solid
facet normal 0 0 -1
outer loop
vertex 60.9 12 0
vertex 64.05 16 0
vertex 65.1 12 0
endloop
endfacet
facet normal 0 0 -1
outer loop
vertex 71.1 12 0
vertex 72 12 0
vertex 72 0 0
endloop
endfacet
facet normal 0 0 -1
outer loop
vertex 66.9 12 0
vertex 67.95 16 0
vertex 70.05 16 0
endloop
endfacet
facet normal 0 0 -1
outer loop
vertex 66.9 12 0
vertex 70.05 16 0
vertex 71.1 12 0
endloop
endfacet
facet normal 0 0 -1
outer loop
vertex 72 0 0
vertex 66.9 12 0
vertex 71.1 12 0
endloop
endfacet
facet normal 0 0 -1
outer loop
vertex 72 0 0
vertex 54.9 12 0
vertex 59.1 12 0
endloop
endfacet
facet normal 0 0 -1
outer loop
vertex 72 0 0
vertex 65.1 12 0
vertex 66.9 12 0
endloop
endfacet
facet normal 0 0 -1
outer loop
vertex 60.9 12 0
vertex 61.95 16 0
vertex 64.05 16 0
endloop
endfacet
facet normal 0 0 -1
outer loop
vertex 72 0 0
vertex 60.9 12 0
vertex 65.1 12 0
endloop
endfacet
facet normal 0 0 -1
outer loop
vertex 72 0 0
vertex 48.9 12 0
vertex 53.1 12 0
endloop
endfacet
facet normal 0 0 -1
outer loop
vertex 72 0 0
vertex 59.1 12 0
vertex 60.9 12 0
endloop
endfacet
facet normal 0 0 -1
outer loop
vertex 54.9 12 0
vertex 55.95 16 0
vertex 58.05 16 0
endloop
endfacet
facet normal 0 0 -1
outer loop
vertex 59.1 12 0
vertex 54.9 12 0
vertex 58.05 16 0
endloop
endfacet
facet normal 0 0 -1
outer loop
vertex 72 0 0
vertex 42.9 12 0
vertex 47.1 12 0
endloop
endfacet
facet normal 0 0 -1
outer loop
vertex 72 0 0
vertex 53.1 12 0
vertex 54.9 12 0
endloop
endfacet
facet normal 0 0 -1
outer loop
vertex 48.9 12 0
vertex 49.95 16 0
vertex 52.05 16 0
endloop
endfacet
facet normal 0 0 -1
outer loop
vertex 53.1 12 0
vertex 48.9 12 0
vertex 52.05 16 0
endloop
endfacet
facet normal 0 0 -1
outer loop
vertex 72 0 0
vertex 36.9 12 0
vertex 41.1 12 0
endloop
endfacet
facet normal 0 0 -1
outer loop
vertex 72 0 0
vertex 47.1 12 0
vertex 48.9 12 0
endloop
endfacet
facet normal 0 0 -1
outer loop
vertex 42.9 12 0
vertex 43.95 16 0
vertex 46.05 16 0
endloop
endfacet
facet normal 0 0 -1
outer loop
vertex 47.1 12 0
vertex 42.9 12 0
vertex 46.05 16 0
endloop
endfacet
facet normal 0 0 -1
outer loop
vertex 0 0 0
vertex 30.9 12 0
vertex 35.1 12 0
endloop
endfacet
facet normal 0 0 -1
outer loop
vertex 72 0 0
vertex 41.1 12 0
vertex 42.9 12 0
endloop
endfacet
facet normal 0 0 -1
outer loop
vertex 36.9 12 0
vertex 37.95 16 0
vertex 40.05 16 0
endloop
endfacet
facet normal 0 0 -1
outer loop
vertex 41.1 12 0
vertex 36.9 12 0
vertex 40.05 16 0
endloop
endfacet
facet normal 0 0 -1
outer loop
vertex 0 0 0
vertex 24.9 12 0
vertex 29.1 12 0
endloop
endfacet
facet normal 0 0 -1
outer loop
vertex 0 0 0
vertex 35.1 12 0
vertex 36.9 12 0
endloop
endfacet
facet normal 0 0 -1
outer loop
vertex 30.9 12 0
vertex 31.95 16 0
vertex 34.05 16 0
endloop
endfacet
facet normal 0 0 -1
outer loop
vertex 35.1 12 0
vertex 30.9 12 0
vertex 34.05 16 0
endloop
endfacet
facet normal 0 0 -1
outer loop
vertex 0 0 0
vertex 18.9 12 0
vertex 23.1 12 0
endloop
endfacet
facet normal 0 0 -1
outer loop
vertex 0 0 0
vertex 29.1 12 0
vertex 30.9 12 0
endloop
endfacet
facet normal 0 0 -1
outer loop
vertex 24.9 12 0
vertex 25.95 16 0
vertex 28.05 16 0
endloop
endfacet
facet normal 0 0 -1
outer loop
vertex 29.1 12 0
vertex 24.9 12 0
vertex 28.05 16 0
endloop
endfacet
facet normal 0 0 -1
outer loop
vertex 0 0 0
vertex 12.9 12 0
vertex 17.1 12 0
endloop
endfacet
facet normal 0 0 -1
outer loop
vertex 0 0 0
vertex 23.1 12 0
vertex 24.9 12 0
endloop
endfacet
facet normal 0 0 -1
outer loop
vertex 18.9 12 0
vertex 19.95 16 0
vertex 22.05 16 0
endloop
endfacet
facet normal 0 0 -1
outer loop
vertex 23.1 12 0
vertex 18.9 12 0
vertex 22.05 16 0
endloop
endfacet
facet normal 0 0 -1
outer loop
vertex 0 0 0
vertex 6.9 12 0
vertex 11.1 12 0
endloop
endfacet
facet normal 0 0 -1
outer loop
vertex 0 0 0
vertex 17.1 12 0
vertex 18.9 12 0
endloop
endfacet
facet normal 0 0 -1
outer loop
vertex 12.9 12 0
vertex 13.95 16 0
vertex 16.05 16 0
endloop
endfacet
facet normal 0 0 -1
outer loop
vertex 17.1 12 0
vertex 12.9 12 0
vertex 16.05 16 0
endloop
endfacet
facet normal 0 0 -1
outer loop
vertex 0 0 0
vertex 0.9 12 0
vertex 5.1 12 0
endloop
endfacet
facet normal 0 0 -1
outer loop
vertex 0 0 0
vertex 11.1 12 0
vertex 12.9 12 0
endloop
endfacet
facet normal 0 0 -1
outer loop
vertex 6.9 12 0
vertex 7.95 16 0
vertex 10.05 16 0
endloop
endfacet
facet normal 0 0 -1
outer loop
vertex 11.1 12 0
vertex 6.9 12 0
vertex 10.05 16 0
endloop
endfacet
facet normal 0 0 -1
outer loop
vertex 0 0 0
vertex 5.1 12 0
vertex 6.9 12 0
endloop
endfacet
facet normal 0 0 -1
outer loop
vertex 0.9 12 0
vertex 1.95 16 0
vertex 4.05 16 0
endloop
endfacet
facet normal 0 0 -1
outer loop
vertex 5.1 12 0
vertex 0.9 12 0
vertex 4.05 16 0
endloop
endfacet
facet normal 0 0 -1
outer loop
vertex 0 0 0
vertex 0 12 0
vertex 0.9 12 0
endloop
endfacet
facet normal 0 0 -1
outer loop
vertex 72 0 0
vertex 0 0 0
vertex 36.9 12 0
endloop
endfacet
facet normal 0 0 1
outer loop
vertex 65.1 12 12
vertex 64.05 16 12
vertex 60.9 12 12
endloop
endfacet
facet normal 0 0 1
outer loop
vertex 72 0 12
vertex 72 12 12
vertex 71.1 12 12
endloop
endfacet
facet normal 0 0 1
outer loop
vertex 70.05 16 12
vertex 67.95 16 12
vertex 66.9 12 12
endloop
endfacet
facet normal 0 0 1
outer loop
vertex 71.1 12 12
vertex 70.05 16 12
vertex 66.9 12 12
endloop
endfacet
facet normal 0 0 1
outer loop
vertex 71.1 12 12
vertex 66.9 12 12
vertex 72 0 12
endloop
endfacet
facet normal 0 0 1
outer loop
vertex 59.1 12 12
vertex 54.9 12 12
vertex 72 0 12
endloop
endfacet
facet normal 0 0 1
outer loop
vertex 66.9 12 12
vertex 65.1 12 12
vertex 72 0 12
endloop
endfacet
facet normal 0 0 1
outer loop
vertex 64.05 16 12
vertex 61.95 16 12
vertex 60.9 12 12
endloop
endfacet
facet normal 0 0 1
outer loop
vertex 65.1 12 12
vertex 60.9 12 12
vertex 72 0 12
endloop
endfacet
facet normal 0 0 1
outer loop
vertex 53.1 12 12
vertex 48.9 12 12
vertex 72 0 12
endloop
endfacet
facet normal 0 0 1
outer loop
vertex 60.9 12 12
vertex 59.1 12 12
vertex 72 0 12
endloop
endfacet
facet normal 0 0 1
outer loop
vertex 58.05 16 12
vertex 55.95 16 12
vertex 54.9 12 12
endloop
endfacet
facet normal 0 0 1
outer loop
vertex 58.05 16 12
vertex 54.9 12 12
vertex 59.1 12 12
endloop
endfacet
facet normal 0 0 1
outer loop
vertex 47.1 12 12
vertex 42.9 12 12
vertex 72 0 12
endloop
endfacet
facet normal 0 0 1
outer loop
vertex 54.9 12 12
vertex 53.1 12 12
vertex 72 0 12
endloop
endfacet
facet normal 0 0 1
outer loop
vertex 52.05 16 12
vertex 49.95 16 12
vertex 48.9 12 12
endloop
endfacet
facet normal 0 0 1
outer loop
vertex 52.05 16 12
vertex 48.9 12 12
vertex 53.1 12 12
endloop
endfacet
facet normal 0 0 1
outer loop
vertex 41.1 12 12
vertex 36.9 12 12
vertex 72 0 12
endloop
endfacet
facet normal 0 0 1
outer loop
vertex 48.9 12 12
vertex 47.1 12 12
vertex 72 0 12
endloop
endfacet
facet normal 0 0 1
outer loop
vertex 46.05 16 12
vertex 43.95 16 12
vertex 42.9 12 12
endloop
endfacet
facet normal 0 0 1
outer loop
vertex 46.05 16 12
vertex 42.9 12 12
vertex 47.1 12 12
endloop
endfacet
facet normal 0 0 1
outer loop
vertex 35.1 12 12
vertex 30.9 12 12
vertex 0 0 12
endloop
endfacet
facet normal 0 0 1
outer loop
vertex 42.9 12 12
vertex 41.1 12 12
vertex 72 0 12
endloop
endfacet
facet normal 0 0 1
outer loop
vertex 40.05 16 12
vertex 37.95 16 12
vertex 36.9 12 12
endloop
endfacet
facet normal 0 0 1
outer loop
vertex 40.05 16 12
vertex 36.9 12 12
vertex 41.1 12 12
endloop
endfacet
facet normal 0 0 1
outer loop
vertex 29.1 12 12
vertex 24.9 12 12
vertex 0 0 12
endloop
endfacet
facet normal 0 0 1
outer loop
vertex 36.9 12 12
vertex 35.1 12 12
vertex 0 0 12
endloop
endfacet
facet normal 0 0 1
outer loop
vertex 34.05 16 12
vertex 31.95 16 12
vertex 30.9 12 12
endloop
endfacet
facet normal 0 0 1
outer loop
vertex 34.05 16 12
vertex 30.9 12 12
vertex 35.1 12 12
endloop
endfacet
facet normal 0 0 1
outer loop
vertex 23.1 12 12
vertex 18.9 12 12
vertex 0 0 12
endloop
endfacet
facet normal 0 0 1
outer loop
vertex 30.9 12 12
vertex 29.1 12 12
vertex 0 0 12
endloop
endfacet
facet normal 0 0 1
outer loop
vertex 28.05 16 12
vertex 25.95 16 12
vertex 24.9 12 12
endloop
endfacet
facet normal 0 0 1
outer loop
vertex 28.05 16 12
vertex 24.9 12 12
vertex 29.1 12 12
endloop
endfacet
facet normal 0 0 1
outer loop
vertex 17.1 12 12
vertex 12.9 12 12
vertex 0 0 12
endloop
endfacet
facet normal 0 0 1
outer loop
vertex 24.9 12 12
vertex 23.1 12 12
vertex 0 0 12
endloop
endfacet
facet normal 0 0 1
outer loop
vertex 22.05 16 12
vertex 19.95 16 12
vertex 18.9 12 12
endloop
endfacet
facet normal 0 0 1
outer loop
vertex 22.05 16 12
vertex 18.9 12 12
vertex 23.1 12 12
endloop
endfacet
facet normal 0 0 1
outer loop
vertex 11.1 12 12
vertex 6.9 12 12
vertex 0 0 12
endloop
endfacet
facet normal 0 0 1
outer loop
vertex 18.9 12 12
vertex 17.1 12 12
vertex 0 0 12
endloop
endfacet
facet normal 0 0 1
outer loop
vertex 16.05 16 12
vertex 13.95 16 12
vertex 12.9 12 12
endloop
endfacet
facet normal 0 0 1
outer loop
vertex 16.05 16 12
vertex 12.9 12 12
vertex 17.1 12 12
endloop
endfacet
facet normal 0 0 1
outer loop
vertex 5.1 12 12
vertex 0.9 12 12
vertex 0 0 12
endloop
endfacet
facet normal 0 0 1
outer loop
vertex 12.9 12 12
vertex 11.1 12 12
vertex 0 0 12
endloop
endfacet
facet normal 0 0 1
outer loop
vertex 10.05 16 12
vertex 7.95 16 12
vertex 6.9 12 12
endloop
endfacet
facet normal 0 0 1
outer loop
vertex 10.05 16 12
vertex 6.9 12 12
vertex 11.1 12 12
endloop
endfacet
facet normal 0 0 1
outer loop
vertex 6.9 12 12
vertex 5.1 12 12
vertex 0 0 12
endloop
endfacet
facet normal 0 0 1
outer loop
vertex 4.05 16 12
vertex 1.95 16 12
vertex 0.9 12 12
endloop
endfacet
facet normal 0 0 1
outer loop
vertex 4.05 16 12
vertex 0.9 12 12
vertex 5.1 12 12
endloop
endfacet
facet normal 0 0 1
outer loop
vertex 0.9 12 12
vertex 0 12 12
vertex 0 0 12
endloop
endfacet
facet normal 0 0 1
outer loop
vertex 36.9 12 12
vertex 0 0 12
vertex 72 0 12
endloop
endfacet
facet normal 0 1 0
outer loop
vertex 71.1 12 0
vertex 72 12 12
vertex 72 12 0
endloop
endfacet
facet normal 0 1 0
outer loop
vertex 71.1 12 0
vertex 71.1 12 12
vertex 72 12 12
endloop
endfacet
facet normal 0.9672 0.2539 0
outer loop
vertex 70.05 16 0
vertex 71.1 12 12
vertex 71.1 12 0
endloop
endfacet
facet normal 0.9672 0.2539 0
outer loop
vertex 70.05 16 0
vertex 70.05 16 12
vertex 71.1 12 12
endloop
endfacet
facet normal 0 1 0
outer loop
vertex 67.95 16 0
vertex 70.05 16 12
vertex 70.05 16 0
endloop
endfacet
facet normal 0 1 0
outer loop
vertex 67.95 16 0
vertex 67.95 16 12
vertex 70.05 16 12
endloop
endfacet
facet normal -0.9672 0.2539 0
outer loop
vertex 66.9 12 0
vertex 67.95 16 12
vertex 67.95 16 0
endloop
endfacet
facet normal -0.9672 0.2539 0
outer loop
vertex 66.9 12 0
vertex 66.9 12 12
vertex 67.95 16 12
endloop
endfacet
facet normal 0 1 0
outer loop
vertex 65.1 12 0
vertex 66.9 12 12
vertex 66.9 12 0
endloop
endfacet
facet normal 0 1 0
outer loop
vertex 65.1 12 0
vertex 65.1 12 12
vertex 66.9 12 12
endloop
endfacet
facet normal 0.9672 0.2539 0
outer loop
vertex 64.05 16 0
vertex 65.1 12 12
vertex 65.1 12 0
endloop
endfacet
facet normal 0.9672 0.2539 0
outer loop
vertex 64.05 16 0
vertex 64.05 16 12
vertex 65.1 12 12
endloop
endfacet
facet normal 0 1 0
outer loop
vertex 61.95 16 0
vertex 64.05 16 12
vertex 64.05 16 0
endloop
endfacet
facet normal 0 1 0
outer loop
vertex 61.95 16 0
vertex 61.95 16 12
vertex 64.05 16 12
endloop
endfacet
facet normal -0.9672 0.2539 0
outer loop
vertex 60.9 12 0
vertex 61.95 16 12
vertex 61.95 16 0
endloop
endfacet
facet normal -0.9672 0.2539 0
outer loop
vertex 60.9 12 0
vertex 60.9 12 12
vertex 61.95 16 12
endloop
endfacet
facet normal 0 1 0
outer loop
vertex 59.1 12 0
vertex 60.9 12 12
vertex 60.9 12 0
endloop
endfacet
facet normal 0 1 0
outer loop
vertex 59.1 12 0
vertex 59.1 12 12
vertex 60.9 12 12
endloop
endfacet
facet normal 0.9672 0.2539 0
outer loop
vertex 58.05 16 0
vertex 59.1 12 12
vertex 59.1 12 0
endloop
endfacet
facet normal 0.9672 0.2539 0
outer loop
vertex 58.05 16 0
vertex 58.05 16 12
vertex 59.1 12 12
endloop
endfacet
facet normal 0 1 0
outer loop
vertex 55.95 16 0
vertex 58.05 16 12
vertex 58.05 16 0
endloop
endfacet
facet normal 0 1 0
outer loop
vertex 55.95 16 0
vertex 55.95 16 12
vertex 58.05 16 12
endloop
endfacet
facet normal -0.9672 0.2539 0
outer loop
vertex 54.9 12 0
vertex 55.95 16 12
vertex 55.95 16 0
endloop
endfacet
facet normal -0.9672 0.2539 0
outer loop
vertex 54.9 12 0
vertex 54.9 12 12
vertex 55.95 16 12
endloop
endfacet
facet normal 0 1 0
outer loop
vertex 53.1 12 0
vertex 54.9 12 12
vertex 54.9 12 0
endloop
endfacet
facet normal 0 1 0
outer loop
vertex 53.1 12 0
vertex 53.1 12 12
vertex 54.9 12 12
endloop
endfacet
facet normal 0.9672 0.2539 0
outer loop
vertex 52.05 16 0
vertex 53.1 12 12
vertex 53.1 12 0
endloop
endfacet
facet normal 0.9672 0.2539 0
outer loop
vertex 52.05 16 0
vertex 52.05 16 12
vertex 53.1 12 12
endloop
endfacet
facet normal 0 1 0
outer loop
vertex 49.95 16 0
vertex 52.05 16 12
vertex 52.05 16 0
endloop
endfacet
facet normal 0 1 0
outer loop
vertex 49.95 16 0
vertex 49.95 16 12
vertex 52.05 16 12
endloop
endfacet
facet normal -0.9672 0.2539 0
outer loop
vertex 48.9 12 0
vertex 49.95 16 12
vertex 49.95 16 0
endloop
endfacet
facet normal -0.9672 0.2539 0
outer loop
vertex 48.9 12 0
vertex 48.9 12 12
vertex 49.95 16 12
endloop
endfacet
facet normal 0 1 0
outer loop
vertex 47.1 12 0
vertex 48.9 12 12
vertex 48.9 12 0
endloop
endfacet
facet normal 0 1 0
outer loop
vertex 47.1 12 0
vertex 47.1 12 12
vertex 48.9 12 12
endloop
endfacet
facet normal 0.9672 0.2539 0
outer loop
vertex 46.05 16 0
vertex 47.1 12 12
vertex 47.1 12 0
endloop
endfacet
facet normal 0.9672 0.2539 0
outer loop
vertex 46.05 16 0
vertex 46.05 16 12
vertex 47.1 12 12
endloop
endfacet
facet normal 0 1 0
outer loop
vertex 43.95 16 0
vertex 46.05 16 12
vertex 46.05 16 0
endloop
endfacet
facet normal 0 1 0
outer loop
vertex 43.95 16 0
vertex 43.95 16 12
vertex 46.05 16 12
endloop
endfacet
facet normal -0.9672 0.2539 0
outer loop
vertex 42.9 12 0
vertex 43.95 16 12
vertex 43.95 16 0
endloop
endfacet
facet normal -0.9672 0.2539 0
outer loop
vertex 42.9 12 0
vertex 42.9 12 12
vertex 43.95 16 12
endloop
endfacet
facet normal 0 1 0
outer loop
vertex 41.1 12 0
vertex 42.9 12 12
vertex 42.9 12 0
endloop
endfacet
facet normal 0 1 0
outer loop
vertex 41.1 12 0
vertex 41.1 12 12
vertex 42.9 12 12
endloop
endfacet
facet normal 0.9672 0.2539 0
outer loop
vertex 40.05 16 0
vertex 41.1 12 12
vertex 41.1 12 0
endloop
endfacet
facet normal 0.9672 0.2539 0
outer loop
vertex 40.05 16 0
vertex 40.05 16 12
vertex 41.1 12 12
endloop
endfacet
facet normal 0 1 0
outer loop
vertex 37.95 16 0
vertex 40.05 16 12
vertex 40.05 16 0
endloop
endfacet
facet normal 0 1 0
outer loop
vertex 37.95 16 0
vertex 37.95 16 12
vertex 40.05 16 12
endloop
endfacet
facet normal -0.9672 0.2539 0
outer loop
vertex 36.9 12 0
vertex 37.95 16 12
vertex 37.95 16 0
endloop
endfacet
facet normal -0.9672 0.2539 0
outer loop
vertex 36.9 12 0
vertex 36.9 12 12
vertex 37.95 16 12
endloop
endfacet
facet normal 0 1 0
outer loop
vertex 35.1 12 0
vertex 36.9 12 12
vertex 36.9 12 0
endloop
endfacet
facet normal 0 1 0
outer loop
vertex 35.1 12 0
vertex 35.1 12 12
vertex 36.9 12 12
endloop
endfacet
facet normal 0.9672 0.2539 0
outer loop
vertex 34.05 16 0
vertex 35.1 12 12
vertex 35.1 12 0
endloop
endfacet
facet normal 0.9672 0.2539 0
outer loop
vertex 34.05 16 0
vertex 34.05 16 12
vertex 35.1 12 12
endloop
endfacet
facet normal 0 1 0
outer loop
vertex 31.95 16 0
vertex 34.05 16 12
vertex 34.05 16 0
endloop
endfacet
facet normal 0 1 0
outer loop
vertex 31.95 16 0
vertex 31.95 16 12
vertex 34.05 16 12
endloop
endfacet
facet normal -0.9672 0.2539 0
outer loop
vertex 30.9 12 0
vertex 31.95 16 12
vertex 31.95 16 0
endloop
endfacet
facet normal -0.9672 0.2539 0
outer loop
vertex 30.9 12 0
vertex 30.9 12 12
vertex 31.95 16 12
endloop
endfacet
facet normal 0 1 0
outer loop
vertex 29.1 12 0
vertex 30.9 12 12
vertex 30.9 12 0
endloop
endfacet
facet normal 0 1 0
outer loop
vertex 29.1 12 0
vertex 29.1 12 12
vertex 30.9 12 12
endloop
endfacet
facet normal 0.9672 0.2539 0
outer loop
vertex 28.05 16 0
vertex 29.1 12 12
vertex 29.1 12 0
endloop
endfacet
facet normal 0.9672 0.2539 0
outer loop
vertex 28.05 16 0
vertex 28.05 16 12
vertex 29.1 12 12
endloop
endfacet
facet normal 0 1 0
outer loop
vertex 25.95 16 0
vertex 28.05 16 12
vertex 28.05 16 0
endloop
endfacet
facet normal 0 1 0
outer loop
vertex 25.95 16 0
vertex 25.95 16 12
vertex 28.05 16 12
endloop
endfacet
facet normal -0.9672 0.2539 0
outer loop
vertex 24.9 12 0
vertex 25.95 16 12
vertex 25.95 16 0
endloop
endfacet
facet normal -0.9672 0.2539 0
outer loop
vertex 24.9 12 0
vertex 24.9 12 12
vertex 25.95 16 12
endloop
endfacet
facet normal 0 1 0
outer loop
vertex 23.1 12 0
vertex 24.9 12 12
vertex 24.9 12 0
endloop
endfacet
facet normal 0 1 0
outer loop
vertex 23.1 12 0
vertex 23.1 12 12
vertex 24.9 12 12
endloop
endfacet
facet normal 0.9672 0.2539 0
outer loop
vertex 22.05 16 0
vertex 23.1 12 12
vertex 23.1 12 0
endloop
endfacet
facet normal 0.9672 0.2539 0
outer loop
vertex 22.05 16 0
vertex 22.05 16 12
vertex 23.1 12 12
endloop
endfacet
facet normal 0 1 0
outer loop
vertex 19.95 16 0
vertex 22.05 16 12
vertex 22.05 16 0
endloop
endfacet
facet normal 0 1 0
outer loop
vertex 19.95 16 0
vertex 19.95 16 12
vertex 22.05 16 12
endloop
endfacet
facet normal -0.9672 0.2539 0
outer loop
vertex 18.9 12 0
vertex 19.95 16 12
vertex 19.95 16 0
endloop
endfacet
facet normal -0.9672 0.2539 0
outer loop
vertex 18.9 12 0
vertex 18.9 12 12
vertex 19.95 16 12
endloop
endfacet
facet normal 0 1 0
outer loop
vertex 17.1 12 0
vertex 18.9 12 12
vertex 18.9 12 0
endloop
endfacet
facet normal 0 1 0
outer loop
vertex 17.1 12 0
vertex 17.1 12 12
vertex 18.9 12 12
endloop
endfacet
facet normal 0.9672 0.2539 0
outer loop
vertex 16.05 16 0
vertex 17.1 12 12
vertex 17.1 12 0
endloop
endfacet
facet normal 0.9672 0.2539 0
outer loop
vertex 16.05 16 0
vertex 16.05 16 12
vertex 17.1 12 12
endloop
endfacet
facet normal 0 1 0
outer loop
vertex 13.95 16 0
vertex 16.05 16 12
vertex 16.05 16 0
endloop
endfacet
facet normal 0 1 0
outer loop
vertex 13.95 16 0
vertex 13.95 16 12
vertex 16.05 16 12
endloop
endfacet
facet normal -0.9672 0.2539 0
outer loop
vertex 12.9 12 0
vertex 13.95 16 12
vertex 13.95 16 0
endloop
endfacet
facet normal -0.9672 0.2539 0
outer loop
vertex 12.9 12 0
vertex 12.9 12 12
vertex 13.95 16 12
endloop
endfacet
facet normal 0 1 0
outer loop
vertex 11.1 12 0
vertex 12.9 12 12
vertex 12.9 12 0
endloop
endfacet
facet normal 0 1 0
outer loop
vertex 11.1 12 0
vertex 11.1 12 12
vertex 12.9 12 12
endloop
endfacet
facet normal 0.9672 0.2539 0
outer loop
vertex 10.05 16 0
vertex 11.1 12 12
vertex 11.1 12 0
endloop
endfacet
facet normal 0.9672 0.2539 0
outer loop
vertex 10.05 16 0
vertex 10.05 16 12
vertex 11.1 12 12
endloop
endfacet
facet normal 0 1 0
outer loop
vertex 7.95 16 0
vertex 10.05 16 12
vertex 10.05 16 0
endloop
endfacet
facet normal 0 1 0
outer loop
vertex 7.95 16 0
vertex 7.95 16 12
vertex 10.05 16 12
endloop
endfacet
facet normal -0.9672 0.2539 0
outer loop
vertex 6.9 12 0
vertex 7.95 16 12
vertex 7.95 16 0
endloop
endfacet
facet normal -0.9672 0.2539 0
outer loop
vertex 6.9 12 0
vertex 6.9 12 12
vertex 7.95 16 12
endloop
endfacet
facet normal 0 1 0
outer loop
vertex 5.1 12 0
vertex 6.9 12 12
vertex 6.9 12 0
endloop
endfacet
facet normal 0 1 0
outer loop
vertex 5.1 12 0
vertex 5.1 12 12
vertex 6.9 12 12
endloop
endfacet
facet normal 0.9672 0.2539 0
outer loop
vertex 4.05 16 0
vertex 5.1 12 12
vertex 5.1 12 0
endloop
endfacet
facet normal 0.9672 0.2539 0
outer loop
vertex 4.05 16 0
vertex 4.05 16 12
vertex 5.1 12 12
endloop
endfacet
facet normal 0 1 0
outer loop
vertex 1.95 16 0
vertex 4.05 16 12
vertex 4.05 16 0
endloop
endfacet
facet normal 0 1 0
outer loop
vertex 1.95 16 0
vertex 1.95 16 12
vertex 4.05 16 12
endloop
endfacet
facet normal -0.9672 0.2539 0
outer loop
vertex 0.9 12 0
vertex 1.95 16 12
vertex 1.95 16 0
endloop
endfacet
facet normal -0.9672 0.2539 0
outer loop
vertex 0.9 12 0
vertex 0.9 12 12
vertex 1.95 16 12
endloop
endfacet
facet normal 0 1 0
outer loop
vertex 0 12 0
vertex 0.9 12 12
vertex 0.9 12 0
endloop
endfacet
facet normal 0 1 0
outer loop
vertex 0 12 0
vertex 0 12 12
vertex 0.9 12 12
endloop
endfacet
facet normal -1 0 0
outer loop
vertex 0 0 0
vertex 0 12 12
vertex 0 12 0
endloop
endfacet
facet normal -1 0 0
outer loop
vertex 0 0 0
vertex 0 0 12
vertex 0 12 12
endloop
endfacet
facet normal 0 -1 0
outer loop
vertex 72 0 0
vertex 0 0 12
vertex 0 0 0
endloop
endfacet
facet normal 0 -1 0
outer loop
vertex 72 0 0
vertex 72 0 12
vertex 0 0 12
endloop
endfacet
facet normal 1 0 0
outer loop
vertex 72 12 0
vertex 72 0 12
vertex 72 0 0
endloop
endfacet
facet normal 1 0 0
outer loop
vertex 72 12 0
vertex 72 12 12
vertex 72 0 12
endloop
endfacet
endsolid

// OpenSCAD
$fn = 32;

// ----------------------------------------------------------------------
// Gear rack: 12 teeth, pitch 6 mm
// ----------------------------------------------------------------------

// --- parameters (mm) ---
teeth = 12;               // number of teeth
pitch = 6;                // tooth pitch, X
root_w = 4.2;             // tooth width at the root
tip_w = 2.1;              // tooth width at the tip
base_h = 12;              // rack body height, Y
tooth_h = 4;              // tooth height above the body
plate_t = 12;             // rack width, Z (extrusion height)

rack_l = teeth * pitch;  // overall length
total_h = base_h + tooth_h;  // overall height

profile = [[0, 0], [72, 0], [72, 12], [71.1, 12], [70.05, 16], [67.95, 16], [66.9, 12], [65.1, 12], [64.05, 16], [61.95, 16], [60.9, 12], [59.1, 12], [58.05, 16], [55.95, 16], [54.9, 12], [53.1, 12], [52.05, 16], [49.95, 16], [48.9, 12], [47.1, 12], [46.05, 16], [43.95, 16], [42.9, 12], [41.1, 12], [40.05, 16], [37.95, 16], [36.9, 12], [35.1, 12], [34.05, 16], [31.95, 16], [30.9, 12], [29.1, 12], [28.05, 16], [25.95, 16], [24.9, 12], [23.1, 12], [22.05, 16], [19.95, 16], [18.9, 12], [17.1, 12], [16.05, 16], [13.95, 16], [12.9, 12], [11.1, 12], [10.05, 16], [7.95, 16], [6.9, 12], [5.1, 12], [4.05, 16], [1.95, 16], [0.9, 12], [0, 12]];  // primary outline, 52 points, counter clockwise

// --- the one profile operation ---
linear_extrude(height = plate_t) polygon(points = profile);
